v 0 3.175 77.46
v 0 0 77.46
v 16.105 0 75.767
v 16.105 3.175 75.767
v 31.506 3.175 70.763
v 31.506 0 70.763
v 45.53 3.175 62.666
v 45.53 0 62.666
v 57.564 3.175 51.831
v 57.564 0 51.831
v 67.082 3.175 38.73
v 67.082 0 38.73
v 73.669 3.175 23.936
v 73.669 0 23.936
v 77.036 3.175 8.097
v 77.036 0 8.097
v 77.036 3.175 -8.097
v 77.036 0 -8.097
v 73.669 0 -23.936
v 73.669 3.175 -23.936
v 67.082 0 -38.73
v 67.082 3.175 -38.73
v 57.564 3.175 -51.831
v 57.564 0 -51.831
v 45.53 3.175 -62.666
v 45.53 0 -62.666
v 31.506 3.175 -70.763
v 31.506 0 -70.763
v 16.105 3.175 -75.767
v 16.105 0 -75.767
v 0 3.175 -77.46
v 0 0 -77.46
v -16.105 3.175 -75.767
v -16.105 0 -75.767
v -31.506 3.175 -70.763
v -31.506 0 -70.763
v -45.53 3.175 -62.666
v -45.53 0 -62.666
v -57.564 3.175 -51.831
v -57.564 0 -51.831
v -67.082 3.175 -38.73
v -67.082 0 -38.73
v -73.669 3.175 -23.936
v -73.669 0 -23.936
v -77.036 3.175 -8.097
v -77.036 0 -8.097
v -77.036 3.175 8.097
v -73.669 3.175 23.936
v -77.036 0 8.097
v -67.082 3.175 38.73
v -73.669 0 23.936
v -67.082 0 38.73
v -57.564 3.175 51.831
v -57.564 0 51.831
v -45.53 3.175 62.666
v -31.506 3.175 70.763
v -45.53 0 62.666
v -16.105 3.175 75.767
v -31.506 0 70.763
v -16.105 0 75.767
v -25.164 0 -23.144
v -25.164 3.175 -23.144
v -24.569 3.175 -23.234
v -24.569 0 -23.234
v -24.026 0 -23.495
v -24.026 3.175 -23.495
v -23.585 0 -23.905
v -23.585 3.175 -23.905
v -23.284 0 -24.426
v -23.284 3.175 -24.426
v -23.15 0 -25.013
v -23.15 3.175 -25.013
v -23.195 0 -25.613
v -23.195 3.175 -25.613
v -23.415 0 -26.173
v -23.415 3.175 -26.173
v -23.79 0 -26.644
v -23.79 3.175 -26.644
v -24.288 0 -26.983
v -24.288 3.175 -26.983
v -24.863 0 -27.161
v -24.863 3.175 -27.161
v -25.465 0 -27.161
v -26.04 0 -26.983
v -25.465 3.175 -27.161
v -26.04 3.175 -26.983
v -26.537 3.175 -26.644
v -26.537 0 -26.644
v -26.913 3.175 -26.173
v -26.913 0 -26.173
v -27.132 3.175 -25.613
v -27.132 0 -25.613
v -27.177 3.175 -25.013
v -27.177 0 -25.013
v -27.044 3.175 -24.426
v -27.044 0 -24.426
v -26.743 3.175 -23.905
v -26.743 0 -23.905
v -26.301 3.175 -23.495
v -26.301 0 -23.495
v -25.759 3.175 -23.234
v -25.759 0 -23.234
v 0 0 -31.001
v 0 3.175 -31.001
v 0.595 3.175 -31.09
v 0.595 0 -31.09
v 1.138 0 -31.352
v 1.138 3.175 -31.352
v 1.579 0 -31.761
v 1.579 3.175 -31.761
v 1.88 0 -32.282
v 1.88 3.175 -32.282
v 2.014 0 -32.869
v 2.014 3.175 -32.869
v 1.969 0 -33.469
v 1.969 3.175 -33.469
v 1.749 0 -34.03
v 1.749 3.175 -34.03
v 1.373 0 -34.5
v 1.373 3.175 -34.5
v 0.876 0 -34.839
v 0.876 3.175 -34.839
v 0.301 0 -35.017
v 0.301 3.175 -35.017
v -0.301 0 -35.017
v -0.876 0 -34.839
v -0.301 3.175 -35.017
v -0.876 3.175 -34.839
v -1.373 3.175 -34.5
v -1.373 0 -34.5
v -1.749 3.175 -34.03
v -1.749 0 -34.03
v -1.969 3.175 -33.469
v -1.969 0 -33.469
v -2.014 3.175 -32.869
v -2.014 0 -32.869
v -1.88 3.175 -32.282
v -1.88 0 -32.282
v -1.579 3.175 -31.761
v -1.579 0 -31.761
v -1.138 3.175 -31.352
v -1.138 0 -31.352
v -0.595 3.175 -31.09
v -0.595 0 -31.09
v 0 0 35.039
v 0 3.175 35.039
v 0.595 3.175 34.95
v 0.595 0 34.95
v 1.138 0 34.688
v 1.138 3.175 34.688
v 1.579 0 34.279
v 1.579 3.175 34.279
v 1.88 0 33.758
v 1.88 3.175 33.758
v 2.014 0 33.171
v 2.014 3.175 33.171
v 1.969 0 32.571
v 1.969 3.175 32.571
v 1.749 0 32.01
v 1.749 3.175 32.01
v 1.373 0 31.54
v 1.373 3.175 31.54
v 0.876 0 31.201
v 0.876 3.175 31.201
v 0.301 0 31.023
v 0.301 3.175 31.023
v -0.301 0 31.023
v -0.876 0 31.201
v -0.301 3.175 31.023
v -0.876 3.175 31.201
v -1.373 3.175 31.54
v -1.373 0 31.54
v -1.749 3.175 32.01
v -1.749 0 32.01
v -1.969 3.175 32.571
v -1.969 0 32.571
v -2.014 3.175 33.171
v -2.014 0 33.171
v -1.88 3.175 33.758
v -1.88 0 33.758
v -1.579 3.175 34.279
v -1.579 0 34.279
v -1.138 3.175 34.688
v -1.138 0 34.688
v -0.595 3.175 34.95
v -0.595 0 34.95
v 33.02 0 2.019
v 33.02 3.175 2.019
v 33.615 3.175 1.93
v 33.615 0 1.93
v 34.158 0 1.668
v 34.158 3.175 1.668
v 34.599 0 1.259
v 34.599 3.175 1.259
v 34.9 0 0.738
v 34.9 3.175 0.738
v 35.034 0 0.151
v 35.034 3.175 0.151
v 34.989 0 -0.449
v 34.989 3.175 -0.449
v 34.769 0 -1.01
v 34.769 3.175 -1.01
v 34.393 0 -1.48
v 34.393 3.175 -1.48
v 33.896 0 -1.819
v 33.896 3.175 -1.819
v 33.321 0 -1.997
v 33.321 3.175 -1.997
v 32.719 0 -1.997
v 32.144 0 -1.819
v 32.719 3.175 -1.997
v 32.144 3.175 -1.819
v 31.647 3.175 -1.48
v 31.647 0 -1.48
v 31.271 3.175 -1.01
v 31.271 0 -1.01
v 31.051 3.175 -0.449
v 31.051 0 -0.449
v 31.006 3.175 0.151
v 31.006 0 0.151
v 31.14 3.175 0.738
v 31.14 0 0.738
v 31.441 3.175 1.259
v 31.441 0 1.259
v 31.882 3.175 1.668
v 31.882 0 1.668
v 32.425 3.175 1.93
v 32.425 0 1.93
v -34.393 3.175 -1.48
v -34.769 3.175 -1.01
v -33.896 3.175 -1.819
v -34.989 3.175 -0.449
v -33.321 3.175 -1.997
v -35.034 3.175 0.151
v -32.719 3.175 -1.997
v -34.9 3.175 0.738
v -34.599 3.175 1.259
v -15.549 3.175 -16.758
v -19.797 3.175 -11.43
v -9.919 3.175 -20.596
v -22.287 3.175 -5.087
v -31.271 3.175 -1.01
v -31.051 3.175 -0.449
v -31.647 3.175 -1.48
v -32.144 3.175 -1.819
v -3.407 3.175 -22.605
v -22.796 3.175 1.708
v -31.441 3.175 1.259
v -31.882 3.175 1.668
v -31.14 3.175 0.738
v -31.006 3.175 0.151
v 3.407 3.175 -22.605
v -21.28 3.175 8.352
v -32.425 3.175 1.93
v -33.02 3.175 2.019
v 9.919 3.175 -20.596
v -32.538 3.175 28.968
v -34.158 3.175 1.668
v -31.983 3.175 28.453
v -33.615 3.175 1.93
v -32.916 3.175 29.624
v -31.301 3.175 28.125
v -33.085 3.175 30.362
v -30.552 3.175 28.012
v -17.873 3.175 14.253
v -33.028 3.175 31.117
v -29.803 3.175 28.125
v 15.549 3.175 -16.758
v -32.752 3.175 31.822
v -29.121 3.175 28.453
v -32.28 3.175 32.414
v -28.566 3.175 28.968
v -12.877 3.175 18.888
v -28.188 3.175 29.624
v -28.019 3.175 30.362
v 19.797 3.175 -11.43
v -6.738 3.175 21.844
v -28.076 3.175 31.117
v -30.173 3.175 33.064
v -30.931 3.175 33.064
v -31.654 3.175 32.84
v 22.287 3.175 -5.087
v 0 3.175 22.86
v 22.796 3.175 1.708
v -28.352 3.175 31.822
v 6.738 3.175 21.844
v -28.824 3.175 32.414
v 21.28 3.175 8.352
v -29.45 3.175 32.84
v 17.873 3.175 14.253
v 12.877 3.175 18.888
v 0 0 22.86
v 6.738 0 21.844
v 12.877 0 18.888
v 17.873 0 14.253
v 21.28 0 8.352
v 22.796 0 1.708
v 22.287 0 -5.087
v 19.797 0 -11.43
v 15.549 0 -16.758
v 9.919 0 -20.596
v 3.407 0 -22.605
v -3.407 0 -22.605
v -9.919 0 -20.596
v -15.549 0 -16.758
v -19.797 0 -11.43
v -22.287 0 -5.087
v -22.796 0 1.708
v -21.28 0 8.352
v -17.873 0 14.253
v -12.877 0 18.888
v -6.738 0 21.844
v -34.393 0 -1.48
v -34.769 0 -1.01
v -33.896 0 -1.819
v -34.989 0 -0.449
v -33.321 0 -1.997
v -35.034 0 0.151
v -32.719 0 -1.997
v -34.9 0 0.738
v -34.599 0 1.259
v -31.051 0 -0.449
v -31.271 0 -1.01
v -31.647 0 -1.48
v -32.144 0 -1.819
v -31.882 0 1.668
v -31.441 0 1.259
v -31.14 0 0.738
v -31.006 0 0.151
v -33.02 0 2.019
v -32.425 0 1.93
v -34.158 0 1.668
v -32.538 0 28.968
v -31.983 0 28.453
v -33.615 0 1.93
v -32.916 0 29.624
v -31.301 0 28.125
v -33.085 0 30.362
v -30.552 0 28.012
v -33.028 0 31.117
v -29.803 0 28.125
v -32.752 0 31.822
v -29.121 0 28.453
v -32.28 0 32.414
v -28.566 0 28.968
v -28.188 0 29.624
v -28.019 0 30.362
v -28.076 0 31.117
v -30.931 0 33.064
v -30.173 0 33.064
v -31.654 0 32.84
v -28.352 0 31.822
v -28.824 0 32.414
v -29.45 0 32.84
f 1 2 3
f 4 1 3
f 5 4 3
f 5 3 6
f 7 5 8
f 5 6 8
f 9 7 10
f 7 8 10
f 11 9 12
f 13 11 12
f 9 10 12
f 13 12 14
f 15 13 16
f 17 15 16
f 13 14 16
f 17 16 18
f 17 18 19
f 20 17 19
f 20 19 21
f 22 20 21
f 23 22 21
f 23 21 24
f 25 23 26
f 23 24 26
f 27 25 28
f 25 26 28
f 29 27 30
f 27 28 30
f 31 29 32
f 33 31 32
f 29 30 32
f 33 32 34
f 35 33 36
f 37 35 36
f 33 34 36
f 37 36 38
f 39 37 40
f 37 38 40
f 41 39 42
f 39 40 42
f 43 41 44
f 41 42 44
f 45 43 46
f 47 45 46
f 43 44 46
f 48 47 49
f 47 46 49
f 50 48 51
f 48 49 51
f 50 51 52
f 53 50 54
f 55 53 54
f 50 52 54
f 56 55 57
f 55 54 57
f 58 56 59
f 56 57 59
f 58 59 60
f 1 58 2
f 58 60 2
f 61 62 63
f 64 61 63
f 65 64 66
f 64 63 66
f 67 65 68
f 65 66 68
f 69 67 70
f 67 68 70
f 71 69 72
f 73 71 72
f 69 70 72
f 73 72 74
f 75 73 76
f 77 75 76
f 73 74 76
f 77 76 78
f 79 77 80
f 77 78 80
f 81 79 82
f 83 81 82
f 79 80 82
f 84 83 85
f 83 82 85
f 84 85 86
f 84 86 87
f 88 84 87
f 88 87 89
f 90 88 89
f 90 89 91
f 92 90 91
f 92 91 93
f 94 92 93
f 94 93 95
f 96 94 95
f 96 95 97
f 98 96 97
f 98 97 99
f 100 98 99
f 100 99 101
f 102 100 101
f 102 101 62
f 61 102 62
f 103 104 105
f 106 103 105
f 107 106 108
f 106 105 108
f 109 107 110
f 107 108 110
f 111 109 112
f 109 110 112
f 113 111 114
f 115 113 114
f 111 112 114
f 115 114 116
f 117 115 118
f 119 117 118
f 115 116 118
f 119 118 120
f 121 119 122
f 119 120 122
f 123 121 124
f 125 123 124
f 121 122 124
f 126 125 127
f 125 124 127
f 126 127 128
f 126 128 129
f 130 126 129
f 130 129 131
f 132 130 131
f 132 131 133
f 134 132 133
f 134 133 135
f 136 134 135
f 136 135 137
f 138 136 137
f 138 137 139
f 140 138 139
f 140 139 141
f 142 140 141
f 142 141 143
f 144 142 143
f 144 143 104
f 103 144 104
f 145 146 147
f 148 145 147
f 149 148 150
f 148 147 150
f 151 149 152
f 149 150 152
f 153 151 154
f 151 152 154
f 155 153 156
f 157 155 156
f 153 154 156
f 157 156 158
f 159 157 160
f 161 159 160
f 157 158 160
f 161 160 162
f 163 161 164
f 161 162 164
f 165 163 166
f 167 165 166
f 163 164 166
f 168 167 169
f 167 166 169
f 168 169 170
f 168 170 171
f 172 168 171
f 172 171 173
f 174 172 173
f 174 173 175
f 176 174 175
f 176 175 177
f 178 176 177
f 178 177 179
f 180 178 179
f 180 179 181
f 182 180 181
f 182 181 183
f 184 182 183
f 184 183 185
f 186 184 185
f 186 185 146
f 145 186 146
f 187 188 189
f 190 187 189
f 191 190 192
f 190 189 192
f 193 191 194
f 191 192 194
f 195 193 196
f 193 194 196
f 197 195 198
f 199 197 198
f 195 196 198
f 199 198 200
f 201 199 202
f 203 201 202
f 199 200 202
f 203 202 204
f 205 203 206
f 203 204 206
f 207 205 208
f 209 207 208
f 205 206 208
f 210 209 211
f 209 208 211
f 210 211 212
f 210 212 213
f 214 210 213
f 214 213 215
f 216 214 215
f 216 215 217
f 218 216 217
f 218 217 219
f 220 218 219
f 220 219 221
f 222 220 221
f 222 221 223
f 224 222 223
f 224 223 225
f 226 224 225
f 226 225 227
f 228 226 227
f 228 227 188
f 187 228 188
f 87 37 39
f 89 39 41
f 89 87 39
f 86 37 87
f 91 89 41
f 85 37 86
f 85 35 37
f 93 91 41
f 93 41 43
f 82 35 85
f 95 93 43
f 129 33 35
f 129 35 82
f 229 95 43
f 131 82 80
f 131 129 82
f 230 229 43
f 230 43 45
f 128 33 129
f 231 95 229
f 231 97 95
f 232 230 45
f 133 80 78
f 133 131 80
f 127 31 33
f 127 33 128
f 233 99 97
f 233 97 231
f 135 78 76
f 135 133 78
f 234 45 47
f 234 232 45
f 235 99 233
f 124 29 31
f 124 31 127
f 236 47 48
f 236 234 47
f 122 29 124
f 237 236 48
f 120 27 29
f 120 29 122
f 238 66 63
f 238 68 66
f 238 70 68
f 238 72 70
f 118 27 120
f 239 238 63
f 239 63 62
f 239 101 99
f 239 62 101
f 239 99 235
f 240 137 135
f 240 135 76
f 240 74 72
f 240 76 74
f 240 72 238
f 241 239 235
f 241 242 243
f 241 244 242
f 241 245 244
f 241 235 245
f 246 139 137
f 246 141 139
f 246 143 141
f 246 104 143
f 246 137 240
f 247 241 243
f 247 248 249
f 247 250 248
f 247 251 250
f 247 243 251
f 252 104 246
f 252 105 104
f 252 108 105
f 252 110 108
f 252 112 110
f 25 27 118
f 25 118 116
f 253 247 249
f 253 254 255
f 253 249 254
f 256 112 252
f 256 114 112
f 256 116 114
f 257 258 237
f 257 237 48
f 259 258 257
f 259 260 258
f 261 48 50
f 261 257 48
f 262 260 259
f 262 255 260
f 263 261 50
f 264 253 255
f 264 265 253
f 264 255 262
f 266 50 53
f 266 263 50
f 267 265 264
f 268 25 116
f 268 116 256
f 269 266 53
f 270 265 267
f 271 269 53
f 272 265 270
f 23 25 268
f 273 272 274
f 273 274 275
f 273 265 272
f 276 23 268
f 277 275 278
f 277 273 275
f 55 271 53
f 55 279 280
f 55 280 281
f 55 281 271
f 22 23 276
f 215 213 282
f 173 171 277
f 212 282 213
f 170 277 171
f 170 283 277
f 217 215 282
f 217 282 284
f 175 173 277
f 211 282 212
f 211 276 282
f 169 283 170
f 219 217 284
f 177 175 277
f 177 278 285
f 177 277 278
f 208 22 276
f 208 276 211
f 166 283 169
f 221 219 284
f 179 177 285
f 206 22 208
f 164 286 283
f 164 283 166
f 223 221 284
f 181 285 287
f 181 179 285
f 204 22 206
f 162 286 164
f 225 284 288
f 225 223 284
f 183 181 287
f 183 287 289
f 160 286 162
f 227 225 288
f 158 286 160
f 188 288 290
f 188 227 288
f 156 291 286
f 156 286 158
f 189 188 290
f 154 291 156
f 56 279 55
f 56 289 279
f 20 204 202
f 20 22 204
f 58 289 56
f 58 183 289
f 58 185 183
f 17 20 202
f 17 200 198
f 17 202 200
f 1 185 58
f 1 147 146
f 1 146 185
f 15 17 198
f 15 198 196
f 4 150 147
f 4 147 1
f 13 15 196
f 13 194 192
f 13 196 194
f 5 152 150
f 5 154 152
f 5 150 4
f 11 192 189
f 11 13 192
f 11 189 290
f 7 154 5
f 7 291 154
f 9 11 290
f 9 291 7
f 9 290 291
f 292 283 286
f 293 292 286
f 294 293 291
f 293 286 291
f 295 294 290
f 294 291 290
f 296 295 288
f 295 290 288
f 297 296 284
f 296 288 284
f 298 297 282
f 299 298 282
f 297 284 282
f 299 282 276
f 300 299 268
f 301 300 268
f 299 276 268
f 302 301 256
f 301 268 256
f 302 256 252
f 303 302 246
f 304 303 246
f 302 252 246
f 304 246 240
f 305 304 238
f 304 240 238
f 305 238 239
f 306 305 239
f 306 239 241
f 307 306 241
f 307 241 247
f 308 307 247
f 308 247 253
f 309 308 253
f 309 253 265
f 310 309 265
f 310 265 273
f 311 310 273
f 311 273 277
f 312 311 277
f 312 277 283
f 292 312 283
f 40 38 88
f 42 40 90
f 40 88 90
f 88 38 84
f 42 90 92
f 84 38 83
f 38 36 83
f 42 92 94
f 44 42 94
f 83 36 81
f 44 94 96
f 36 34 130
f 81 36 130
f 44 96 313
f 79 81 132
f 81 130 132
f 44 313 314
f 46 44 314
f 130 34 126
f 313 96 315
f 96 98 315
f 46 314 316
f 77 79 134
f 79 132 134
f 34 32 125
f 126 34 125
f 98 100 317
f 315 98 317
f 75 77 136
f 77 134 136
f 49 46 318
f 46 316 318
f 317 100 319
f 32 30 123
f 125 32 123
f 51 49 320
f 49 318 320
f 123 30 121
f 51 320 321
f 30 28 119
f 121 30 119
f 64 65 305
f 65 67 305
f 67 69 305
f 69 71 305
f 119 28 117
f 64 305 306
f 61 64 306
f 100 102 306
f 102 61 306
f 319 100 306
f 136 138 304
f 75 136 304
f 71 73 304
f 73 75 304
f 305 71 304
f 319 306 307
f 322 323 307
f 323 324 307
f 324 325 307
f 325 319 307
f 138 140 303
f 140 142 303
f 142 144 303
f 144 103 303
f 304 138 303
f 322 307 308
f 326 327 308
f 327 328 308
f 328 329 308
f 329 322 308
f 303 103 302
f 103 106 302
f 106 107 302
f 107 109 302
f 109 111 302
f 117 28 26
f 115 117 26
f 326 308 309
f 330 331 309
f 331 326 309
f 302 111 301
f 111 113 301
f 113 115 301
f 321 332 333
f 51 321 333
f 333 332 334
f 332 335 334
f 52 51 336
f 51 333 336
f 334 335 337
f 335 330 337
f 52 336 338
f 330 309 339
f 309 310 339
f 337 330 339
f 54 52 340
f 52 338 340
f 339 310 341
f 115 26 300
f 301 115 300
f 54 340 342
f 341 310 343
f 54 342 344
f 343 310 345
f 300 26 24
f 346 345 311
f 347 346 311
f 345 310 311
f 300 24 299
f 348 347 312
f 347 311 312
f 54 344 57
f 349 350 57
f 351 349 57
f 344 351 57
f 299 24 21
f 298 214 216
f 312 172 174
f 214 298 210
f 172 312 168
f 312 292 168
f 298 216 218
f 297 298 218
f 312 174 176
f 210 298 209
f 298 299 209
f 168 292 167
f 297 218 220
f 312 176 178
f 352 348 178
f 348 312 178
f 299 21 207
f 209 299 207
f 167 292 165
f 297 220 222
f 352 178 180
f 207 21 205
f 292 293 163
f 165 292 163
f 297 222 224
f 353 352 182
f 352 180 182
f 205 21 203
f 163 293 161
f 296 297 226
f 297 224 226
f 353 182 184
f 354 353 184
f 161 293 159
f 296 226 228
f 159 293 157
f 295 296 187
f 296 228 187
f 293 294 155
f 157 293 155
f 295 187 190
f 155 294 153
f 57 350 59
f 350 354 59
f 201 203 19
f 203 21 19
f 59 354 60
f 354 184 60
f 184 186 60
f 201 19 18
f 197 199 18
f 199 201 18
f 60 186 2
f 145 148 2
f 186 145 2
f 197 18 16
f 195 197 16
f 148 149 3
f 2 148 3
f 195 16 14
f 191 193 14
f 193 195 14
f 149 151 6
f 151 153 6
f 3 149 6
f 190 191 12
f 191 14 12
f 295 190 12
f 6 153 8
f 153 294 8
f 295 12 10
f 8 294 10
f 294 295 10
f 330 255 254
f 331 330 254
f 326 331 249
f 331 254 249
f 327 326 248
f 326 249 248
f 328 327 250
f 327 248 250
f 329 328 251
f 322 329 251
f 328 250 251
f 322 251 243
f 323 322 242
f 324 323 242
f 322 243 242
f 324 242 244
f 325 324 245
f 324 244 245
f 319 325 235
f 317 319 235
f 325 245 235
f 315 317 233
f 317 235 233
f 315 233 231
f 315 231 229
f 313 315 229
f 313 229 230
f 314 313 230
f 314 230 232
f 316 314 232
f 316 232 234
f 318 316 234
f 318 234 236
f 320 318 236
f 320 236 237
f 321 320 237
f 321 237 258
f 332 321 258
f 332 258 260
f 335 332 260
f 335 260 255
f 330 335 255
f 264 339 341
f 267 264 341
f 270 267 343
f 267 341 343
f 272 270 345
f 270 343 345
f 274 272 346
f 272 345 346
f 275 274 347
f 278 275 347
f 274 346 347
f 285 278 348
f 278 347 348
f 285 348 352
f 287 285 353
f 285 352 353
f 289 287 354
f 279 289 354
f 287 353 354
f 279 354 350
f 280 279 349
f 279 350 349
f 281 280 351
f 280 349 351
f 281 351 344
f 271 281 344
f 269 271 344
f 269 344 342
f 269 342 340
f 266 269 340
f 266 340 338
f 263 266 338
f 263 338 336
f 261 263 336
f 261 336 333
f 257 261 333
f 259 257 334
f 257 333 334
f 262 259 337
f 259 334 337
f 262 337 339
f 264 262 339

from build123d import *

# Parameters (mm, degrees)
SKETCH1_R           = 77.4600051
BOSS_EXTRUDE1_DEPTH = 3.175
SKETCH20_R          = 22.86
SKETCH20_R_2        = 2.0193
CUT_EXTRUDE10_DEPTH = 251.865681086
SKETCH21_R          = 2.0193
CUT_EXTRUDE11_DEPTH = 251.865681086
SKETCH23_R          = 2.54
CUT_EXTRUDE13_DEPTH = 3.175


with BuildPart() as part:
    # Sketch1 → Boss-Extrude1 (new body)
    with BuildSketch(Plane(origin=(0, 0, 0), x_dir=(1, 0, 0), z_dir=(0, 1, 0))):
        with Locations(Location((0, 0, 0), (0, 0, 270))):
            Circle(SKETCH1_R)
    extrude(amount=BOSS_EXTRUDE1_DEPTH)

    # Sketch20 → Cut-Extrude10 (cut, through all)
    with BuildSketch(Plane(origin=(-73.768816189, 25.4, -121.080352405), x_dir=(1, 0, 0), z_dir=(0, 1, 0))):
        with Locations(Location((73.768816189, -121.080352405, 0), (0, 0, 270))):
            Circle(SKETCH20_R)
        with Locations(Location((73.768816189, -88.060352405, 0), (0, 0, 270))):
            Circle(SKETCH20_R_2)
        with Locations(Location((106.788816189, -121.080352405, 0), (0, 0, 270))):
            Circle(SKETCH20_R_2)
        with Locations(Location((73.768816189, -154.100352405, 0), (0, 0, 270))):
            Circle(SKETCH20_R_2)
        with Locations(Location((40.748816189, -121.080352405, 0), (0, 0, 270))):
            Circle(SKETCH20_R_2)
    extrude(amount=-CUT_EXTRUDE10_DEPTH, mode=Mode.SUBTRACT)

    # Sketch21 → Cut-Extrude11 (cut, through all)
    with BuildSketch(Plane(origin=(-73.768816189, 25.4, -121.080352405), x_dir=(1, 0, 0), z_dir=(0, 1, 0))):
        with Locations(Location((48.605023435, -95.916559651, 0), (0, 0, 270))):
            Circle(SKETCH21_R)
    extrude(amount=-CUT_EXTRUDE11_DEPTH, mode=Mode.SUBTRACT)

    # Sketch23 → Cut-Extrude13 (cut)
    with BuildSketch(Plane(origin=(-73.768816189, 0, -121.080352405), x_dir=(1, 0, 0), z_dir=(0, -1, 0))):
        with Locations(Location((43.216869762, 151.632298832, 0), (0, 0, 270))):
            Circle(SKETCH23_R)
    extrude(amount=-CUT_EXTRUDE13_DEPTH, mode=Mode.SUBTRACT)


solid = part.part
